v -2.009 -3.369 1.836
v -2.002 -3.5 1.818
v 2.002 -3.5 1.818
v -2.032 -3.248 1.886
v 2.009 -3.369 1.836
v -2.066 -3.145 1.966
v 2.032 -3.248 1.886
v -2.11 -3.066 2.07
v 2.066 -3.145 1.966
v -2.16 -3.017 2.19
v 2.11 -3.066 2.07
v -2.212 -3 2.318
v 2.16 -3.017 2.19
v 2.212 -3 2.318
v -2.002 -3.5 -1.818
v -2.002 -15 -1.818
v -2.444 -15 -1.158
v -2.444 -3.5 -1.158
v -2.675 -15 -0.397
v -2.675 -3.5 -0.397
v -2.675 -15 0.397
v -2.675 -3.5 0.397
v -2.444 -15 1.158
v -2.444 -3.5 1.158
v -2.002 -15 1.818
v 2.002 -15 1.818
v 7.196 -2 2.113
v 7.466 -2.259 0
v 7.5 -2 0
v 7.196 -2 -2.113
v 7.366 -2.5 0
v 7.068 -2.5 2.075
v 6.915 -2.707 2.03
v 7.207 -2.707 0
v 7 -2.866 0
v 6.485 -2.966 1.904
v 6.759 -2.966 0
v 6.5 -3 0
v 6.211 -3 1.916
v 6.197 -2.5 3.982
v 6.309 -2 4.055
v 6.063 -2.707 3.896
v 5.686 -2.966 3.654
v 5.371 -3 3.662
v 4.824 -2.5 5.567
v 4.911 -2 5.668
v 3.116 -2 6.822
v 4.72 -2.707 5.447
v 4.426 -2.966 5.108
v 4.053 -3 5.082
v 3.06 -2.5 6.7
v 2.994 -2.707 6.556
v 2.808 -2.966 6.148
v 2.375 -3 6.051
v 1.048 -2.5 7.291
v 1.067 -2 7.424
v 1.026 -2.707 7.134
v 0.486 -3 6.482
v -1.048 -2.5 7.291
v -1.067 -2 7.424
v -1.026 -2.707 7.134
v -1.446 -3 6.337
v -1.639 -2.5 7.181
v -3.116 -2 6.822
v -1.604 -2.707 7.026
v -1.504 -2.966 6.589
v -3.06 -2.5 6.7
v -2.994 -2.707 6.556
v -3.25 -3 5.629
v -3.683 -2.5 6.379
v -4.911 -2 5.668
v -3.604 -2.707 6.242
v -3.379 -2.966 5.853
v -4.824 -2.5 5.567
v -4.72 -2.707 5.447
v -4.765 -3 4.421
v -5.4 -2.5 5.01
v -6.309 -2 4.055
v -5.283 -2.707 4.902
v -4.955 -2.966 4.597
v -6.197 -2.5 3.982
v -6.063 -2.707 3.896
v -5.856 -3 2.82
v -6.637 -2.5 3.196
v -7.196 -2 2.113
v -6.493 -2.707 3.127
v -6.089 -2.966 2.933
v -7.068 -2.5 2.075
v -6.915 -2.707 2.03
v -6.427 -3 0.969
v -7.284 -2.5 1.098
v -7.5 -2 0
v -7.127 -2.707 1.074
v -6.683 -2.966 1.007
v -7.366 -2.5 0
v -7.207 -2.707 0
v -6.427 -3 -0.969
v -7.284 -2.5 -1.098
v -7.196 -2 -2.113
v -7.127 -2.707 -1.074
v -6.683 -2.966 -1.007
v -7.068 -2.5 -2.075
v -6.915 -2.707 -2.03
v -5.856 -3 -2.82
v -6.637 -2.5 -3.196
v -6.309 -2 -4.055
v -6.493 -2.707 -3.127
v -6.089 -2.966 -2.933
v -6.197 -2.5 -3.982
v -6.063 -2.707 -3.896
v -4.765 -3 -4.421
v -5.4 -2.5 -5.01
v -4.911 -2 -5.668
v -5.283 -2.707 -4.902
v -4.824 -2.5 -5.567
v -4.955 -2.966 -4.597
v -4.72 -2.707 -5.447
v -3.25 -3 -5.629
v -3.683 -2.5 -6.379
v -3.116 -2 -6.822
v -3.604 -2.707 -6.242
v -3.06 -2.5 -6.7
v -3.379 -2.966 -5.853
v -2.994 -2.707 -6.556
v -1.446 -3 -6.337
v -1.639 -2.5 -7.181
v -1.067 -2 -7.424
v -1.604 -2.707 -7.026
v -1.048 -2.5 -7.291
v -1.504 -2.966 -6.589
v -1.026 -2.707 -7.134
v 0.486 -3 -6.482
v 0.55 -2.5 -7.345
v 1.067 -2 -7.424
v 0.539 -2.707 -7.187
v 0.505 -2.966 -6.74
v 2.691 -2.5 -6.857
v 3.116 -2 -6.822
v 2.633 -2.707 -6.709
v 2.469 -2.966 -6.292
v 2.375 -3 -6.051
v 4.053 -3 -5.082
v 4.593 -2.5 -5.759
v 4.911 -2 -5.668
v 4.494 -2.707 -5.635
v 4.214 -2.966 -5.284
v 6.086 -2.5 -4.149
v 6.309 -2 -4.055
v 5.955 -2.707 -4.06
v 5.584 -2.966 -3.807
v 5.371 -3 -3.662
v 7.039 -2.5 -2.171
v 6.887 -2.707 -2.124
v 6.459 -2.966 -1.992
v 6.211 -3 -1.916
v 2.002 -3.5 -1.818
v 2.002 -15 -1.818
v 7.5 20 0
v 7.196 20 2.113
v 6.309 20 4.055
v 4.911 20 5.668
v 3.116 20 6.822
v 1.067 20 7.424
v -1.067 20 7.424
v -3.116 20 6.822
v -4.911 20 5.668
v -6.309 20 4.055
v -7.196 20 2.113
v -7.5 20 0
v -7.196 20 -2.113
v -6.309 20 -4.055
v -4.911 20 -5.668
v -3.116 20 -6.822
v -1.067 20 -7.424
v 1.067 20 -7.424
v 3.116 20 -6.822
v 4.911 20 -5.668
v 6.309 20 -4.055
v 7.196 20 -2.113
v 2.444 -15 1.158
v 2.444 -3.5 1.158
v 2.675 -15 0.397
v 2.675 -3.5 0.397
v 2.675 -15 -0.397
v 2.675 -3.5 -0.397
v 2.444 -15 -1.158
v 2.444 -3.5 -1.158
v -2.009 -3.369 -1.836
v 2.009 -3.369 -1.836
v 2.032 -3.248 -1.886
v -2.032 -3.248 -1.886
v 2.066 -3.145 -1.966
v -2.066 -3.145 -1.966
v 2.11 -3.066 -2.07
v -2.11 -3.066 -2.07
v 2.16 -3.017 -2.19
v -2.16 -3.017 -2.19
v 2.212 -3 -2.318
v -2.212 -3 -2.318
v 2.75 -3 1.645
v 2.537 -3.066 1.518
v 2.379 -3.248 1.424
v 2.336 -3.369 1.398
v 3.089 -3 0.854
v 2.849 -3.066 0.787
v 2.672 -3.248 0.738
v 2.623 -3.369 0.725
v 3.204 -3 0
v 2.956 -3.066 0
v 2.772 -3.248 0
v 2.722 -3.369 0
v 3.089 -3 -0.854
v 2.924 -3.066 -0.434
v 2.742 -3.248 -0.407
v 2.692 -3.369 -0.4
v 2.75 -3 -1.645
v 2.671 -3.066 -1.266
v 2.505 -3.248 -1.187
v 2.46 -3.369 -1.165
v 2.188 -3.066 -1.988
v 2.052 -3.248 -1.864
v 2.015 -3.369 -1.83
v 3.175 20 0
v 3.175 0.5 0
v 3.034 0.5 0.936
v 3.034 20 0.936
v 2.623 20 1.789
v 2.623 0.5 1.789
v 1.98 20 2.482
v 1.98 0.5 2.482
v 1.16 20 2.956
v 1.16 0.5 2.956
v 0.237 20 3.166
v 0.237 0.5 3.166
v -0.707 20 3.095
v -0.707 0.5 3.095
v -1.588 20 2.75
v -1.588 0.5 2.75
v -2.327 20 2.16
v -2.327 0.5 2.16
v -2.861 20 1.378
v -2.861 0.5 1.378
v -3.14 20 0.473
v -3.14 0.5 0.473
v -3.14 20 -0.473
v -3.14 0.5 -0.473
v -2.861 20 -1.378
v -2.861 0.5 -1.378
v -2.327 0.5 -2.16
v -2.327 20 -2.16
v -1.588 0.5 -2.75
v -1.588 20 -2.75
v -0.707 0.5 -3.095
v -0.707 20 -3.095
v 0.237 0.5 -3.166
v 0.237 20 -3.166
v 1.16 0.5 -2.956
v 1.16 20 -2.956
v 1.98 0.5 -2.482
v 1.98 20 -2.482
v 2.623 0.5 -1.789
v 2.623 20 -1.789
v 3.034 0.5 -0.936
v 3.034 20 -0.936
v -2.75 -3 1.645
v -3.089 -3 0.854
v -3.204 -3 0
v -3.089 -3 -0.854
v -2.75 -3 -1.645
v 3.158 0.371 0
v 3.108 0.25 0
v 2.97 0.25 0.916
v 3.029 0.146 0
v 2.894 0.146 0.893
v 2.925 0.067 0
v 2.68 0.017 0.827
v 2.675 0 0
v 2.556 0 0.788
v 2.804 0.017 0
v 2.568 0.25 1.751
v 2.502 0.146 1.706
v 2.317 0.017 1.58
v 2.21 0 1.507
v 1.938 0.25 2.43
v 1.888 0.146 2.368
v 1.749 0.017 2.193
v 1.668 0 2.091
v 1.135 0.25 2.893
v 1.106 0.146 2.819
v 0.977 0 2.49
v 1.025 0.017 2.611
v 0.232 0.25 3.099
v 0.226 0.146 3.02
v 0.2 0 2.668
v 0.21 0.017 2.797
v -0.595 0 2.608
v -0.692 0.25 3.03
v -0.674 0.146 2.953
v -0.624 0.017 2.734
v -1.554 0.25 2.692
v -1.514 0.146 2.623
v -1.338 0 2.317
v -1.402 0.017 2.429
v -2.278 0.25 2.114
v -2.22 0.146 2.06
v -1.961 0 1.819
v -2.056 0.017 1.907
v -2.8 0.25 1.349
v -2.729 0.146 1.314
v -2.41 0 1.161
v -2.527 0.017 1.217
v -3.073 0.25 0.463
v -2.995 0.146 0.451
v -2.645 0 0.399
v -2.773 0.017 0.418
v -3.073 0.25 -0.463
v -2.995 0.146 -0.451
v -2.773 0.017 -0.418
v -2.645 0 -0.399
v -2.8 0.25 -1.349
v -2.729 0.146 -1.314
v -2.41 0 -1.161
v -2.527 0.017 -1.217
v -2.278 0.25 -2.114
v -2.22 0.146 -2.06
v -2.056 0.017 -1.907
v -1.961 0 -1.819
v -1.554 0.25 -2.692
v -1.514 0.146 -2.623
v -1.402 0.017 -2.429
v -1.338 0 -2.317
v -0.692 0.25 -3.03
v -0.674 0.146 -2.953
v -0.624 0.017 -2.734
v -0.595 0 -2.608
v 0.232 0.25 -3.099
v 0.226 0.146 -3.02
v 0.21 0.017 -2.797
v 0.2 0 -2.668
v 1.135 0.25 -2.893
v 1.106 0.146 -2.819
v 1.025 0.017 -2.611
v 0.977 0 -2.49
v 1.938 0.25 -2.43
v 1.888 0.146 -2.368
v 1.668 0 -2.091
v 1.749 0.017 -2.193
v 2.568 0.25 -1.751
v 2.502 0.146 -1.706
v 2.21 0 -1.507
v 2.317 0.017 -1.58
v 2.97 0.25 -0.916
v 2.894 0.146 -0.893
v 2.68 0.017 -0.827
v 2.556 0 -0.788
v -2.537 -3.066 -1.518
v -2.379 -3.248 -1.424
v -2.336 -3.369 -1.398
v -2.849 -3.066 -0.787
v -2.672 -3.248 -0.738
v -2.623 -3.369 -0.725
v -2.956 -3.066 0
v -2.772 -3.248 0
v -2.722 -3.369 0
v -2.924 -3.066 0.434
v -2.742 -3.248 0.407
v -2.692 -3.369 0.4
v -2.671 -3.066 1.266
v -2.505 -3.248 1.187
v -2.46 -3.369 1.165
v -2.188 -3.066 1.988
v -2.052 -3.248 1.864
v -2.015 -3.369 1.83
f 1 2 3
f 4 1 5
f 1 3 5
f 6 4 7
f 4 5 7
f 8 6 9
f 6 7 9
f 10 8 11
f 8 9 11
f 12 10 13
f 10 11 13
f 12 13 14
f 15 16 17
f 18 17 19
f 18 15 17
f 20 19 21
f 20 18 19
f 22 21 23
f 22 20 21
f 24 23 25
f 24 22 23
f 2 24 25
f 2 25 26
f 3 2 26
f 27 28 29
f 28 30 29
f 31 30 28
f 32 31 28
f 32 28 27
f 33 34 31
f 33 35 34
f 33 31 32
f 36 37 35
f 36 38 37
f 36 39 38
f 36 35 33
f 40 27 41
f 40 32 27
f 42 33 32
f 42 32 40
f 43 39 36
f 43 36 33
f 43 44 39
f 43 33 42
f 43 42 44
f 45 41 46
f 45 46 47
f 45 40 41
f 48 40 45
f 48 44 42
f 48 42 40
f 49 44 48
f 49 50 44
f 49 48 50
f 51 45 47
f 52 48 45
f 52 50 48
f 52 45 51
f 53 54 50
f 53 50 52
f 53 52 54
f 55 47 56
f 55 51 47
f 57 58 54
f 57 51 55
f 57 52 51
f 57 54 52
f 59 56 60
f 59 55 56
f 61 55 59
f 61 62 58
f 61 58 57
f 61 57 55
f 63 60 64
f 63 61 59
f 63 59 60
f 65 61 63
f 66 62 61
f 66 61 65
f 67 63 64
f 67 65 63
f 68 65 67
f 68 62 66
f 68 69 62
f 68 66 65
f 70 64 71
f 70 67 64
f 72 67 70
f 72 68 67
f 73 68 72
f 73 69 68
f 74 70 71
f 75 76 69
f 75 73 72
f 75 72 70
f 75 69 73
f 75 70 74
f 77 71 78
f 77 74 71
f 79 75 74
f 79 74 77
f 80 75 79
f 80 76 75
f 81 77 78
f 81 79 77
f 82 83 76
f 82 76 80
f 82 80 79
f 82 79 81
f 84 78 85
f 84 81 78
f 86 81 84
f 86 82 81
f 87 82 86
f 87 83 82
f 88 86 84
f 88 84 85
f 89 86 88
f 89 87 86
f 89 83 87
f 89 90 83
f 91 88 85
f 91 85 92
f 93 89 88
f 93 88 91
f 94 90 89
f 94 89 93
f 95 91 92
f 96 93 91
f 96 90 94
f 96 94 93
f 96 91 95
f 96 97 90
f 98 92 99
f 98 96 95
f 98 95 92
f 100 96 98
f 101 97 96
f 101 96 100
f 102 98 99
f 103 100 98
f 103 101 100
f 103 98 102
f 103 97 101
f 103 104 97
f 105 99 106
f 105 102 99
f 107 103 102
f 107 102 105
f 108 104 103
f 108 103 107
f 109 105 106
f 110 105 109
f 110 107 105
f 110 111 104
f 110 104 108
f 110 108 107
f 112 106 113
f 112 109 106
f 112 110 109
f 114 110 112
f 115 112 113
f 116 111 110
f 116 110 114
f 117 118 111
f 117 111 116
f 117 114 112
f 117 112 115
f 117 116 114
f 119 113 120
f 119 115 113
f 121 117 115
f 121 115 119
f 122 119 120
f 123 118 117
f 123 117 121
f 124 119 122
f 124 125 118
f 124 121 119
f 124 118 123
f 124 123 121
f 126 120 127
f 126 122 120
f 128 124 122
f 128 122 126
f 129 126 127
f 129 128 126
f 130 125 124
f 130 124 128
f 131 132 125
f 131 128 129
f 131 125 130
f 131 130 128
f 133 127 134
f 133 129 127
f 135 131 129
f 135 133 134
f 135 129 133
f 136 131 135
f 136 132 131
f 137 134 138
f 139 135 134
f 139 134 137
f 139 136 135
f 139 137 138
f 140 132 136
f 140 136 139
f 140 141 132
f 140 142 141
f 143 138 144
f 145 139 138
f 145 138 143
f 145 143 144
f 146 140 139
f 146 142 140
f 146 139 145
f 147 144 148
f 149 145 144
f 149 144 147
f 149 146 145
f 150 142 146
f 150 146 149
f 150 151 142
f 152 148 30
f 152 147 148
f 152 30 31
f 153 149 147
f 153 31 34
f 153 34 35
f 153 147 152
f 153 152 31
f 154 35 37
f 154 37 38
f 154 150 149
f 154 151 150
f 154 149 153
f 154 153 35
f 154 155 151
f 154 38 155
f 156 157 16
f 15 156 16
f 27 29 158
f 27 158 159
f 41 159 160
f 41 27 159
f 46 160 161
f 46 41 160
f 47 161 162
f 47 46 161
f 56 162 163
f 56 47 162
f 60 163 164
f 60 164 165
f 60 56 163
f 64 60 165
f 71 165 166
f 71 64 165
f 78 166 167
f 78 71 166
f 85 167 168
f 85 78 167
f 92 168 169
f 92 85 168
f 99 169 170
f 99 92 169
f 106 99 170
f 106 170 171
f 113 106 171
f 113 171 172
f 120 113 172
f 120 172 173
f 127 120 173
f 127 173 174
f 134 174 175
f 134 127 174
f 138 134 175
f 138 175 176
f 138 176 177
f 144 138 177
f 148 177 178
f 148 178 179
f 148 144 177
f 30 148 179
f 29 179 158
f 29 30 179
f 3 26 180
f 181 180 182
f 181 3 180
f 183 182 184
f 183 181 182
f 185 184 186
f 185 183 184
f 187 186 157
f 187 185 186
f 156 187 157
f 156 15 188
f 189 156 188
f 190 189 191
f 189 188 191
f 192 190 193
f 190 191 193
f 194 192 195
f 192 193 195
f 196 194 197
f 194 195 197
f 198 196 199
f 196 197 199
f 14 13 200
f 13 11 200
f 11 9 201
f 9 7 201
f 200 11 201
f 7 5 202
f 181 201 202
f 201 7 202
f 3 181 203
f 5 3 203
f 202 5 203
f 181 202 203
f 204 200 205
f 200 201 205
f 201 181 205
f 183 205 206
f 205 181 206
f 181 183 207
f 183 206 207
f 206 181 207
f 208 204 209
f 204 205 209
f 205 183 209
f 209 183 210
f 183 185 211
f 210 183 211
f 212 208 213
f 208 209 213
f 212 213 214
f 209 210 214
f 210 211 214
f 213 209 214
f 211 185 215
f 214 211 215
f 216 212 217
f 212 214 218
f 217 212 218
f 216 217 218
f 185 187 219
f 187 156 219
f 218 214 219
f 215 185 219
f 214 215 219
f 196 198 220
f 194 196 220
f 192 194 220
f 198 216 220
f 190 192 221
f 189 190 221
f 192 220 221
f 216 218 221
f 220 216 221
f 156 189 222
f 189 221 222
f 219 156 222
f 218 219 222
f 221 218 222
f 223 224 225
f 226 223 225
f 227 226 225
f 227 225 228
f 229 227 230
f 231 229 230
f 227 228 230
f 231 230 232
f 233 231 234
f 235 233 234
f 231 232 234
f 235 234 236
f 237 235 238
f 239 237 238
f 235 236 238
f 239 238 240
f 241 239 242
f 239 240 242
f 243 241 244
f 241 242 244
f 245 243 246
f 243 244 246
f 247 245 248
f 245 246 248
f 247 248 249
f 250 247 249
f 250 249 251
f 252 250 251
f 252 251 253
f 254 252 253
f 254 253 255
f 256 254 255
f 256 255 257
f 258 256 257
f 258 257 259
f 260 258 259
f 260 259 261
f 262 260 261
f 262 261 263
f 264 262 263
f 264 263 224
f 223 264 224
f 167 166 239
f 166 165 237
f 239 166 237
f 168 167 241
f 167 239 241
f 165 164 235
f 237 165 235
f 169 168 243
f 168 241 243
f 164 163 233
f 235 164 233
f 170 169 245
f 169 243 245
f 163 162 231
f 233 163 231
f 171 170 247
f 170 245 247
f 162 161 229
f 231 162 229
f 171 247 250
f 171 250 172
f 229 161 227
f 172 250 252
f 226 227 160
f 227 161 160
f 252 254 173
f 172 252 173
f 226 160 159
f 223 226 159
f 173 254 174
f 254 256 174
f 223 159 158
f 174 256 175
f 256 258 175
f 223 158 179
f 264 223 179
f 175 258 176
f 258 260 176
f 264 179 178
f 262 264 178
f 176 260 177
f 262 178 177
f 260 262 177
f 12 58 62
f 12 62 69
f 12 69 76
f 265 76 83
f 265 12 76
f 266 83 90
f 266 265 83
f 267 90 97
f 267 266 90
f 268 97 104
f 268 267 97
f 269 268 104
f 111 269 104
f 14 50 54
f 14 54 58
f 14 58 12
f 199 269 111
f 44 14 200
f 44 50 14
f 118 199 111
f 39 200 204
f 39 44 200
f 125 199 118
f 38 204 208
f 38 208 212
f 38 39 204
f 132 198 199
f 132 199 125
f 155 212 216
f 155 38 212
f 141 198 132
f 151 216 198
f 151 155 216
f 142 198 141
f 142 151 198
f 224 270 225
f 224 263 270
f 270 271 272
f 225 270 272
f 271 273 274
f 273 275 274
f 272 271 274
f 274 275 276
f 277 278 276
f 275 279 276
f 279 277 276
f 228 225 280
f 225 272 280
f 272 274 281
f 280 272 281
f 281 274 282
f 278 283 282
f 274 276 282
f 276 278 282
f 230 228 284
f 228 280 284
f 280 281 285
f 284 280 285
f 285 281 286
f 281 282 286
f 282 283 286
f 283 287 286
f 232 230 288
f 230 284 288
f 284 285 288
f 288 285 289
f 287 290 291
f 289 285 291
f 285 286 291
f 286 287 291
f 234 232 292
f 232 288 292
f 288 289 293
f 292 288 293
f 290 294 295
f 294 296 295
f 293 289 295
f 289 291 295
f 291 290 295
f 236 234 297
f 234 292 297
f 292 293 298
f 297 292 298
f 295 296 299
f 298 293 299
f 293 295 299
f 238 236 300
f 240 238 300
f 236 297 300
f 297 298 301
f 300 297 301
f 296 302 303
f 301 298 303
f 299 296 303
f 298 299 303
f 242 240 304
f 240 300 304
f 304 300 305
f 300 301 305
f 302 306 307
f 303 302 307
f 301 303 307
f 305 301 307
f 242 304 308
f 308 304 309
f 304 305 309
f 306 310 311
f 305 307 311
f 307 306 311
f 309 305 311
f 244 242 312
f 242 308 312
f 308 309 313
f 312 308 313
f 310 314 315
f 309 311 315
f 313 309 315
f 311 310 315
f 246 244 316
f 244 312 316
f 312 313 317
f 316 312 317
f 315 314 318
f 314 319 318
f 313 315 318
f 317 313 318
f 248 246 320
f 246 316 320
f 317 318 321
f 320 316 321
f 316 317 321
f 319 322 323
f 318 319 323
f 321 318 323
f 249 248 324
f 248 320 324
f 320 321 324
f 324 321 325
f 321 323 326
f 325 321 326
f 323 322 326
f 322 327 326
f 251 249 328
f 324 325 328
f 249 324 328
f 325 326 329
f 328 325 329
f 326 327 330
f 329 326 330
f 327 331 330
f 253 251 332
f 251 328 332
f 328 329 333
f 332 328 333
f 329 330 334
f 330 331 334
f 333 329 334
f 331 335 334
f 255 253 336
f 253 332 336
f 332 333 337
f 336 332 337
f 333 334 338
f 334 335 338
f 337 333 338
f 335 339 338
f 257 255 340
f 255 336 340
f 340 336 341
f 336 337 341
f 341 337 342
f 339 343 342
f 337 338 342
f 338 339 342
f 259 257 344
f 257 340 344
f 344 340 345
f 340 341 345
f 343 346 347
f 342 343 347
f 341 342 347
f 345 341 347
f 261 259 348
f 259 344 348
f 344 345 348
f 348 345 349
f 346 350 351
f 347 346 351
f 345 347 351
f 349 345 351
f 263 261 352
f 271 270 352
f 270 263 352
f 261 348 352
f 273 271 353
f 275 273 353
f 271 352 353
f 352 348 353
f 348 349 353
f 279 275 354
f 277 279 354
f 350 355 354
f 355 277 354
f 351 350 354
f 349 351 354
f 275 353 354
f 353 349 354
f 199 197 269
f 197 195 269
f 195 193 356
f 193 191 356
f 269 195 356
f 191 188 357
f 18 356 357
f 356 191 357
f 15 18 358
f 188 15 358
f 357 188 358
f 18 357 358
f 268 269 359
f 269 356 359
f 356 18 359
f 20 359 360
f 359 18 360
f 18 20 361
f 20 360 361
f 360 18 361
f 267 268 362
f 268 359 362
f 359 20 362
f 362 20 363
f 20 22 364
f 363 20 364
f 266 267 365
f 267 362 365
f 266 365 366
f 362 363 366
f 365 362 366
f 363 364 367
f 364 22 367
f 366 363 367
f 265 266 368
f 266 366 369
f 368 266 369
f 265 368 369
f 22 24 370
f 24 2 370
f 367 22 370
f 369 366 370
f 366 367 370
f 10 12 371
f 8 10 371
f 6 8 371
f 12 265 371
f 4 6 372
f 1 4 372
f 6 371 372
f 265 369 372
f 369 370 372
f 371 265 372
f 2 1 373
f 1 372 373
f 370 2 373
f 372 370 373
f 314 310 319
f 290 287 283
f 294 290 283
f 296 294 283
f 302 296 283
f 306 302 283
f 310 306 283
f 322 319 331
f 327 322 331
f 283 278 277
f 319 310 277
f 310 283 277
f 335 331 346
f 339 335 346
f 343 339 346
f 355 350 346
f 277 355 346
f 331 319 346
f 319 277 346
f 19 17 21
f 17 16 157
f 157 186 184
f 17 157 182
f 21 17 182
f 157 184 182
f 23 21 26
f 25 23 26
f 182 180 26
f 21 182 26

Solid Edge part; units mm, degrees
sketch "Sketch1" plane through (0, 0, 0) normal (0, -1, 0) x (1, 0, 0)
  circle A0 centre (0, 0) radius 3.175
  circle A1 centre (0, 0) radius 7.5
extrude "Protrusion1" add sketch "Sketch1" against normal blind 20
sketch "Sketch2" plane through (0, 0, 0) normal (0, -1, 0) x (1, 0, 0)
  circle A0 centre (0, 0) radius 7.5
extrude "ExtrudedProtrusion_2" add sketch "Sketch2" along normal blind 3
fillet "Round_1" radius 1 1 edges at (-7.5, -3, 0)
sketch "Sketch3" plane through (0, -3, 0) normal (0, -1, 0) x (1, 0, 0)
  line L0 (2.0018, -1.8183) -> (-2.0018, -1.8183)
  arc A0 (-2.0018, -1.8183) -> (-2.0018, 1.8183) centre (0, 0) cw
  line L1 (-2.0018, 1.8183) -> (2.0018, 1.8183)
  arc A1 (2.0018, 1.8183) -> (2.0018, -1.8183) centre (0, 0) cw
extrude "ExtrudedProtrusion_3" add sketch "Sketch3" along normal blind 12
fillet "Round_2" radius 0.5 5 edges at (0, -3, 1.8183) (2.7044, -3, 0) (0, -3, -1.8183) (-3.175, 0, 0) (-2.7044, -3, 0)
